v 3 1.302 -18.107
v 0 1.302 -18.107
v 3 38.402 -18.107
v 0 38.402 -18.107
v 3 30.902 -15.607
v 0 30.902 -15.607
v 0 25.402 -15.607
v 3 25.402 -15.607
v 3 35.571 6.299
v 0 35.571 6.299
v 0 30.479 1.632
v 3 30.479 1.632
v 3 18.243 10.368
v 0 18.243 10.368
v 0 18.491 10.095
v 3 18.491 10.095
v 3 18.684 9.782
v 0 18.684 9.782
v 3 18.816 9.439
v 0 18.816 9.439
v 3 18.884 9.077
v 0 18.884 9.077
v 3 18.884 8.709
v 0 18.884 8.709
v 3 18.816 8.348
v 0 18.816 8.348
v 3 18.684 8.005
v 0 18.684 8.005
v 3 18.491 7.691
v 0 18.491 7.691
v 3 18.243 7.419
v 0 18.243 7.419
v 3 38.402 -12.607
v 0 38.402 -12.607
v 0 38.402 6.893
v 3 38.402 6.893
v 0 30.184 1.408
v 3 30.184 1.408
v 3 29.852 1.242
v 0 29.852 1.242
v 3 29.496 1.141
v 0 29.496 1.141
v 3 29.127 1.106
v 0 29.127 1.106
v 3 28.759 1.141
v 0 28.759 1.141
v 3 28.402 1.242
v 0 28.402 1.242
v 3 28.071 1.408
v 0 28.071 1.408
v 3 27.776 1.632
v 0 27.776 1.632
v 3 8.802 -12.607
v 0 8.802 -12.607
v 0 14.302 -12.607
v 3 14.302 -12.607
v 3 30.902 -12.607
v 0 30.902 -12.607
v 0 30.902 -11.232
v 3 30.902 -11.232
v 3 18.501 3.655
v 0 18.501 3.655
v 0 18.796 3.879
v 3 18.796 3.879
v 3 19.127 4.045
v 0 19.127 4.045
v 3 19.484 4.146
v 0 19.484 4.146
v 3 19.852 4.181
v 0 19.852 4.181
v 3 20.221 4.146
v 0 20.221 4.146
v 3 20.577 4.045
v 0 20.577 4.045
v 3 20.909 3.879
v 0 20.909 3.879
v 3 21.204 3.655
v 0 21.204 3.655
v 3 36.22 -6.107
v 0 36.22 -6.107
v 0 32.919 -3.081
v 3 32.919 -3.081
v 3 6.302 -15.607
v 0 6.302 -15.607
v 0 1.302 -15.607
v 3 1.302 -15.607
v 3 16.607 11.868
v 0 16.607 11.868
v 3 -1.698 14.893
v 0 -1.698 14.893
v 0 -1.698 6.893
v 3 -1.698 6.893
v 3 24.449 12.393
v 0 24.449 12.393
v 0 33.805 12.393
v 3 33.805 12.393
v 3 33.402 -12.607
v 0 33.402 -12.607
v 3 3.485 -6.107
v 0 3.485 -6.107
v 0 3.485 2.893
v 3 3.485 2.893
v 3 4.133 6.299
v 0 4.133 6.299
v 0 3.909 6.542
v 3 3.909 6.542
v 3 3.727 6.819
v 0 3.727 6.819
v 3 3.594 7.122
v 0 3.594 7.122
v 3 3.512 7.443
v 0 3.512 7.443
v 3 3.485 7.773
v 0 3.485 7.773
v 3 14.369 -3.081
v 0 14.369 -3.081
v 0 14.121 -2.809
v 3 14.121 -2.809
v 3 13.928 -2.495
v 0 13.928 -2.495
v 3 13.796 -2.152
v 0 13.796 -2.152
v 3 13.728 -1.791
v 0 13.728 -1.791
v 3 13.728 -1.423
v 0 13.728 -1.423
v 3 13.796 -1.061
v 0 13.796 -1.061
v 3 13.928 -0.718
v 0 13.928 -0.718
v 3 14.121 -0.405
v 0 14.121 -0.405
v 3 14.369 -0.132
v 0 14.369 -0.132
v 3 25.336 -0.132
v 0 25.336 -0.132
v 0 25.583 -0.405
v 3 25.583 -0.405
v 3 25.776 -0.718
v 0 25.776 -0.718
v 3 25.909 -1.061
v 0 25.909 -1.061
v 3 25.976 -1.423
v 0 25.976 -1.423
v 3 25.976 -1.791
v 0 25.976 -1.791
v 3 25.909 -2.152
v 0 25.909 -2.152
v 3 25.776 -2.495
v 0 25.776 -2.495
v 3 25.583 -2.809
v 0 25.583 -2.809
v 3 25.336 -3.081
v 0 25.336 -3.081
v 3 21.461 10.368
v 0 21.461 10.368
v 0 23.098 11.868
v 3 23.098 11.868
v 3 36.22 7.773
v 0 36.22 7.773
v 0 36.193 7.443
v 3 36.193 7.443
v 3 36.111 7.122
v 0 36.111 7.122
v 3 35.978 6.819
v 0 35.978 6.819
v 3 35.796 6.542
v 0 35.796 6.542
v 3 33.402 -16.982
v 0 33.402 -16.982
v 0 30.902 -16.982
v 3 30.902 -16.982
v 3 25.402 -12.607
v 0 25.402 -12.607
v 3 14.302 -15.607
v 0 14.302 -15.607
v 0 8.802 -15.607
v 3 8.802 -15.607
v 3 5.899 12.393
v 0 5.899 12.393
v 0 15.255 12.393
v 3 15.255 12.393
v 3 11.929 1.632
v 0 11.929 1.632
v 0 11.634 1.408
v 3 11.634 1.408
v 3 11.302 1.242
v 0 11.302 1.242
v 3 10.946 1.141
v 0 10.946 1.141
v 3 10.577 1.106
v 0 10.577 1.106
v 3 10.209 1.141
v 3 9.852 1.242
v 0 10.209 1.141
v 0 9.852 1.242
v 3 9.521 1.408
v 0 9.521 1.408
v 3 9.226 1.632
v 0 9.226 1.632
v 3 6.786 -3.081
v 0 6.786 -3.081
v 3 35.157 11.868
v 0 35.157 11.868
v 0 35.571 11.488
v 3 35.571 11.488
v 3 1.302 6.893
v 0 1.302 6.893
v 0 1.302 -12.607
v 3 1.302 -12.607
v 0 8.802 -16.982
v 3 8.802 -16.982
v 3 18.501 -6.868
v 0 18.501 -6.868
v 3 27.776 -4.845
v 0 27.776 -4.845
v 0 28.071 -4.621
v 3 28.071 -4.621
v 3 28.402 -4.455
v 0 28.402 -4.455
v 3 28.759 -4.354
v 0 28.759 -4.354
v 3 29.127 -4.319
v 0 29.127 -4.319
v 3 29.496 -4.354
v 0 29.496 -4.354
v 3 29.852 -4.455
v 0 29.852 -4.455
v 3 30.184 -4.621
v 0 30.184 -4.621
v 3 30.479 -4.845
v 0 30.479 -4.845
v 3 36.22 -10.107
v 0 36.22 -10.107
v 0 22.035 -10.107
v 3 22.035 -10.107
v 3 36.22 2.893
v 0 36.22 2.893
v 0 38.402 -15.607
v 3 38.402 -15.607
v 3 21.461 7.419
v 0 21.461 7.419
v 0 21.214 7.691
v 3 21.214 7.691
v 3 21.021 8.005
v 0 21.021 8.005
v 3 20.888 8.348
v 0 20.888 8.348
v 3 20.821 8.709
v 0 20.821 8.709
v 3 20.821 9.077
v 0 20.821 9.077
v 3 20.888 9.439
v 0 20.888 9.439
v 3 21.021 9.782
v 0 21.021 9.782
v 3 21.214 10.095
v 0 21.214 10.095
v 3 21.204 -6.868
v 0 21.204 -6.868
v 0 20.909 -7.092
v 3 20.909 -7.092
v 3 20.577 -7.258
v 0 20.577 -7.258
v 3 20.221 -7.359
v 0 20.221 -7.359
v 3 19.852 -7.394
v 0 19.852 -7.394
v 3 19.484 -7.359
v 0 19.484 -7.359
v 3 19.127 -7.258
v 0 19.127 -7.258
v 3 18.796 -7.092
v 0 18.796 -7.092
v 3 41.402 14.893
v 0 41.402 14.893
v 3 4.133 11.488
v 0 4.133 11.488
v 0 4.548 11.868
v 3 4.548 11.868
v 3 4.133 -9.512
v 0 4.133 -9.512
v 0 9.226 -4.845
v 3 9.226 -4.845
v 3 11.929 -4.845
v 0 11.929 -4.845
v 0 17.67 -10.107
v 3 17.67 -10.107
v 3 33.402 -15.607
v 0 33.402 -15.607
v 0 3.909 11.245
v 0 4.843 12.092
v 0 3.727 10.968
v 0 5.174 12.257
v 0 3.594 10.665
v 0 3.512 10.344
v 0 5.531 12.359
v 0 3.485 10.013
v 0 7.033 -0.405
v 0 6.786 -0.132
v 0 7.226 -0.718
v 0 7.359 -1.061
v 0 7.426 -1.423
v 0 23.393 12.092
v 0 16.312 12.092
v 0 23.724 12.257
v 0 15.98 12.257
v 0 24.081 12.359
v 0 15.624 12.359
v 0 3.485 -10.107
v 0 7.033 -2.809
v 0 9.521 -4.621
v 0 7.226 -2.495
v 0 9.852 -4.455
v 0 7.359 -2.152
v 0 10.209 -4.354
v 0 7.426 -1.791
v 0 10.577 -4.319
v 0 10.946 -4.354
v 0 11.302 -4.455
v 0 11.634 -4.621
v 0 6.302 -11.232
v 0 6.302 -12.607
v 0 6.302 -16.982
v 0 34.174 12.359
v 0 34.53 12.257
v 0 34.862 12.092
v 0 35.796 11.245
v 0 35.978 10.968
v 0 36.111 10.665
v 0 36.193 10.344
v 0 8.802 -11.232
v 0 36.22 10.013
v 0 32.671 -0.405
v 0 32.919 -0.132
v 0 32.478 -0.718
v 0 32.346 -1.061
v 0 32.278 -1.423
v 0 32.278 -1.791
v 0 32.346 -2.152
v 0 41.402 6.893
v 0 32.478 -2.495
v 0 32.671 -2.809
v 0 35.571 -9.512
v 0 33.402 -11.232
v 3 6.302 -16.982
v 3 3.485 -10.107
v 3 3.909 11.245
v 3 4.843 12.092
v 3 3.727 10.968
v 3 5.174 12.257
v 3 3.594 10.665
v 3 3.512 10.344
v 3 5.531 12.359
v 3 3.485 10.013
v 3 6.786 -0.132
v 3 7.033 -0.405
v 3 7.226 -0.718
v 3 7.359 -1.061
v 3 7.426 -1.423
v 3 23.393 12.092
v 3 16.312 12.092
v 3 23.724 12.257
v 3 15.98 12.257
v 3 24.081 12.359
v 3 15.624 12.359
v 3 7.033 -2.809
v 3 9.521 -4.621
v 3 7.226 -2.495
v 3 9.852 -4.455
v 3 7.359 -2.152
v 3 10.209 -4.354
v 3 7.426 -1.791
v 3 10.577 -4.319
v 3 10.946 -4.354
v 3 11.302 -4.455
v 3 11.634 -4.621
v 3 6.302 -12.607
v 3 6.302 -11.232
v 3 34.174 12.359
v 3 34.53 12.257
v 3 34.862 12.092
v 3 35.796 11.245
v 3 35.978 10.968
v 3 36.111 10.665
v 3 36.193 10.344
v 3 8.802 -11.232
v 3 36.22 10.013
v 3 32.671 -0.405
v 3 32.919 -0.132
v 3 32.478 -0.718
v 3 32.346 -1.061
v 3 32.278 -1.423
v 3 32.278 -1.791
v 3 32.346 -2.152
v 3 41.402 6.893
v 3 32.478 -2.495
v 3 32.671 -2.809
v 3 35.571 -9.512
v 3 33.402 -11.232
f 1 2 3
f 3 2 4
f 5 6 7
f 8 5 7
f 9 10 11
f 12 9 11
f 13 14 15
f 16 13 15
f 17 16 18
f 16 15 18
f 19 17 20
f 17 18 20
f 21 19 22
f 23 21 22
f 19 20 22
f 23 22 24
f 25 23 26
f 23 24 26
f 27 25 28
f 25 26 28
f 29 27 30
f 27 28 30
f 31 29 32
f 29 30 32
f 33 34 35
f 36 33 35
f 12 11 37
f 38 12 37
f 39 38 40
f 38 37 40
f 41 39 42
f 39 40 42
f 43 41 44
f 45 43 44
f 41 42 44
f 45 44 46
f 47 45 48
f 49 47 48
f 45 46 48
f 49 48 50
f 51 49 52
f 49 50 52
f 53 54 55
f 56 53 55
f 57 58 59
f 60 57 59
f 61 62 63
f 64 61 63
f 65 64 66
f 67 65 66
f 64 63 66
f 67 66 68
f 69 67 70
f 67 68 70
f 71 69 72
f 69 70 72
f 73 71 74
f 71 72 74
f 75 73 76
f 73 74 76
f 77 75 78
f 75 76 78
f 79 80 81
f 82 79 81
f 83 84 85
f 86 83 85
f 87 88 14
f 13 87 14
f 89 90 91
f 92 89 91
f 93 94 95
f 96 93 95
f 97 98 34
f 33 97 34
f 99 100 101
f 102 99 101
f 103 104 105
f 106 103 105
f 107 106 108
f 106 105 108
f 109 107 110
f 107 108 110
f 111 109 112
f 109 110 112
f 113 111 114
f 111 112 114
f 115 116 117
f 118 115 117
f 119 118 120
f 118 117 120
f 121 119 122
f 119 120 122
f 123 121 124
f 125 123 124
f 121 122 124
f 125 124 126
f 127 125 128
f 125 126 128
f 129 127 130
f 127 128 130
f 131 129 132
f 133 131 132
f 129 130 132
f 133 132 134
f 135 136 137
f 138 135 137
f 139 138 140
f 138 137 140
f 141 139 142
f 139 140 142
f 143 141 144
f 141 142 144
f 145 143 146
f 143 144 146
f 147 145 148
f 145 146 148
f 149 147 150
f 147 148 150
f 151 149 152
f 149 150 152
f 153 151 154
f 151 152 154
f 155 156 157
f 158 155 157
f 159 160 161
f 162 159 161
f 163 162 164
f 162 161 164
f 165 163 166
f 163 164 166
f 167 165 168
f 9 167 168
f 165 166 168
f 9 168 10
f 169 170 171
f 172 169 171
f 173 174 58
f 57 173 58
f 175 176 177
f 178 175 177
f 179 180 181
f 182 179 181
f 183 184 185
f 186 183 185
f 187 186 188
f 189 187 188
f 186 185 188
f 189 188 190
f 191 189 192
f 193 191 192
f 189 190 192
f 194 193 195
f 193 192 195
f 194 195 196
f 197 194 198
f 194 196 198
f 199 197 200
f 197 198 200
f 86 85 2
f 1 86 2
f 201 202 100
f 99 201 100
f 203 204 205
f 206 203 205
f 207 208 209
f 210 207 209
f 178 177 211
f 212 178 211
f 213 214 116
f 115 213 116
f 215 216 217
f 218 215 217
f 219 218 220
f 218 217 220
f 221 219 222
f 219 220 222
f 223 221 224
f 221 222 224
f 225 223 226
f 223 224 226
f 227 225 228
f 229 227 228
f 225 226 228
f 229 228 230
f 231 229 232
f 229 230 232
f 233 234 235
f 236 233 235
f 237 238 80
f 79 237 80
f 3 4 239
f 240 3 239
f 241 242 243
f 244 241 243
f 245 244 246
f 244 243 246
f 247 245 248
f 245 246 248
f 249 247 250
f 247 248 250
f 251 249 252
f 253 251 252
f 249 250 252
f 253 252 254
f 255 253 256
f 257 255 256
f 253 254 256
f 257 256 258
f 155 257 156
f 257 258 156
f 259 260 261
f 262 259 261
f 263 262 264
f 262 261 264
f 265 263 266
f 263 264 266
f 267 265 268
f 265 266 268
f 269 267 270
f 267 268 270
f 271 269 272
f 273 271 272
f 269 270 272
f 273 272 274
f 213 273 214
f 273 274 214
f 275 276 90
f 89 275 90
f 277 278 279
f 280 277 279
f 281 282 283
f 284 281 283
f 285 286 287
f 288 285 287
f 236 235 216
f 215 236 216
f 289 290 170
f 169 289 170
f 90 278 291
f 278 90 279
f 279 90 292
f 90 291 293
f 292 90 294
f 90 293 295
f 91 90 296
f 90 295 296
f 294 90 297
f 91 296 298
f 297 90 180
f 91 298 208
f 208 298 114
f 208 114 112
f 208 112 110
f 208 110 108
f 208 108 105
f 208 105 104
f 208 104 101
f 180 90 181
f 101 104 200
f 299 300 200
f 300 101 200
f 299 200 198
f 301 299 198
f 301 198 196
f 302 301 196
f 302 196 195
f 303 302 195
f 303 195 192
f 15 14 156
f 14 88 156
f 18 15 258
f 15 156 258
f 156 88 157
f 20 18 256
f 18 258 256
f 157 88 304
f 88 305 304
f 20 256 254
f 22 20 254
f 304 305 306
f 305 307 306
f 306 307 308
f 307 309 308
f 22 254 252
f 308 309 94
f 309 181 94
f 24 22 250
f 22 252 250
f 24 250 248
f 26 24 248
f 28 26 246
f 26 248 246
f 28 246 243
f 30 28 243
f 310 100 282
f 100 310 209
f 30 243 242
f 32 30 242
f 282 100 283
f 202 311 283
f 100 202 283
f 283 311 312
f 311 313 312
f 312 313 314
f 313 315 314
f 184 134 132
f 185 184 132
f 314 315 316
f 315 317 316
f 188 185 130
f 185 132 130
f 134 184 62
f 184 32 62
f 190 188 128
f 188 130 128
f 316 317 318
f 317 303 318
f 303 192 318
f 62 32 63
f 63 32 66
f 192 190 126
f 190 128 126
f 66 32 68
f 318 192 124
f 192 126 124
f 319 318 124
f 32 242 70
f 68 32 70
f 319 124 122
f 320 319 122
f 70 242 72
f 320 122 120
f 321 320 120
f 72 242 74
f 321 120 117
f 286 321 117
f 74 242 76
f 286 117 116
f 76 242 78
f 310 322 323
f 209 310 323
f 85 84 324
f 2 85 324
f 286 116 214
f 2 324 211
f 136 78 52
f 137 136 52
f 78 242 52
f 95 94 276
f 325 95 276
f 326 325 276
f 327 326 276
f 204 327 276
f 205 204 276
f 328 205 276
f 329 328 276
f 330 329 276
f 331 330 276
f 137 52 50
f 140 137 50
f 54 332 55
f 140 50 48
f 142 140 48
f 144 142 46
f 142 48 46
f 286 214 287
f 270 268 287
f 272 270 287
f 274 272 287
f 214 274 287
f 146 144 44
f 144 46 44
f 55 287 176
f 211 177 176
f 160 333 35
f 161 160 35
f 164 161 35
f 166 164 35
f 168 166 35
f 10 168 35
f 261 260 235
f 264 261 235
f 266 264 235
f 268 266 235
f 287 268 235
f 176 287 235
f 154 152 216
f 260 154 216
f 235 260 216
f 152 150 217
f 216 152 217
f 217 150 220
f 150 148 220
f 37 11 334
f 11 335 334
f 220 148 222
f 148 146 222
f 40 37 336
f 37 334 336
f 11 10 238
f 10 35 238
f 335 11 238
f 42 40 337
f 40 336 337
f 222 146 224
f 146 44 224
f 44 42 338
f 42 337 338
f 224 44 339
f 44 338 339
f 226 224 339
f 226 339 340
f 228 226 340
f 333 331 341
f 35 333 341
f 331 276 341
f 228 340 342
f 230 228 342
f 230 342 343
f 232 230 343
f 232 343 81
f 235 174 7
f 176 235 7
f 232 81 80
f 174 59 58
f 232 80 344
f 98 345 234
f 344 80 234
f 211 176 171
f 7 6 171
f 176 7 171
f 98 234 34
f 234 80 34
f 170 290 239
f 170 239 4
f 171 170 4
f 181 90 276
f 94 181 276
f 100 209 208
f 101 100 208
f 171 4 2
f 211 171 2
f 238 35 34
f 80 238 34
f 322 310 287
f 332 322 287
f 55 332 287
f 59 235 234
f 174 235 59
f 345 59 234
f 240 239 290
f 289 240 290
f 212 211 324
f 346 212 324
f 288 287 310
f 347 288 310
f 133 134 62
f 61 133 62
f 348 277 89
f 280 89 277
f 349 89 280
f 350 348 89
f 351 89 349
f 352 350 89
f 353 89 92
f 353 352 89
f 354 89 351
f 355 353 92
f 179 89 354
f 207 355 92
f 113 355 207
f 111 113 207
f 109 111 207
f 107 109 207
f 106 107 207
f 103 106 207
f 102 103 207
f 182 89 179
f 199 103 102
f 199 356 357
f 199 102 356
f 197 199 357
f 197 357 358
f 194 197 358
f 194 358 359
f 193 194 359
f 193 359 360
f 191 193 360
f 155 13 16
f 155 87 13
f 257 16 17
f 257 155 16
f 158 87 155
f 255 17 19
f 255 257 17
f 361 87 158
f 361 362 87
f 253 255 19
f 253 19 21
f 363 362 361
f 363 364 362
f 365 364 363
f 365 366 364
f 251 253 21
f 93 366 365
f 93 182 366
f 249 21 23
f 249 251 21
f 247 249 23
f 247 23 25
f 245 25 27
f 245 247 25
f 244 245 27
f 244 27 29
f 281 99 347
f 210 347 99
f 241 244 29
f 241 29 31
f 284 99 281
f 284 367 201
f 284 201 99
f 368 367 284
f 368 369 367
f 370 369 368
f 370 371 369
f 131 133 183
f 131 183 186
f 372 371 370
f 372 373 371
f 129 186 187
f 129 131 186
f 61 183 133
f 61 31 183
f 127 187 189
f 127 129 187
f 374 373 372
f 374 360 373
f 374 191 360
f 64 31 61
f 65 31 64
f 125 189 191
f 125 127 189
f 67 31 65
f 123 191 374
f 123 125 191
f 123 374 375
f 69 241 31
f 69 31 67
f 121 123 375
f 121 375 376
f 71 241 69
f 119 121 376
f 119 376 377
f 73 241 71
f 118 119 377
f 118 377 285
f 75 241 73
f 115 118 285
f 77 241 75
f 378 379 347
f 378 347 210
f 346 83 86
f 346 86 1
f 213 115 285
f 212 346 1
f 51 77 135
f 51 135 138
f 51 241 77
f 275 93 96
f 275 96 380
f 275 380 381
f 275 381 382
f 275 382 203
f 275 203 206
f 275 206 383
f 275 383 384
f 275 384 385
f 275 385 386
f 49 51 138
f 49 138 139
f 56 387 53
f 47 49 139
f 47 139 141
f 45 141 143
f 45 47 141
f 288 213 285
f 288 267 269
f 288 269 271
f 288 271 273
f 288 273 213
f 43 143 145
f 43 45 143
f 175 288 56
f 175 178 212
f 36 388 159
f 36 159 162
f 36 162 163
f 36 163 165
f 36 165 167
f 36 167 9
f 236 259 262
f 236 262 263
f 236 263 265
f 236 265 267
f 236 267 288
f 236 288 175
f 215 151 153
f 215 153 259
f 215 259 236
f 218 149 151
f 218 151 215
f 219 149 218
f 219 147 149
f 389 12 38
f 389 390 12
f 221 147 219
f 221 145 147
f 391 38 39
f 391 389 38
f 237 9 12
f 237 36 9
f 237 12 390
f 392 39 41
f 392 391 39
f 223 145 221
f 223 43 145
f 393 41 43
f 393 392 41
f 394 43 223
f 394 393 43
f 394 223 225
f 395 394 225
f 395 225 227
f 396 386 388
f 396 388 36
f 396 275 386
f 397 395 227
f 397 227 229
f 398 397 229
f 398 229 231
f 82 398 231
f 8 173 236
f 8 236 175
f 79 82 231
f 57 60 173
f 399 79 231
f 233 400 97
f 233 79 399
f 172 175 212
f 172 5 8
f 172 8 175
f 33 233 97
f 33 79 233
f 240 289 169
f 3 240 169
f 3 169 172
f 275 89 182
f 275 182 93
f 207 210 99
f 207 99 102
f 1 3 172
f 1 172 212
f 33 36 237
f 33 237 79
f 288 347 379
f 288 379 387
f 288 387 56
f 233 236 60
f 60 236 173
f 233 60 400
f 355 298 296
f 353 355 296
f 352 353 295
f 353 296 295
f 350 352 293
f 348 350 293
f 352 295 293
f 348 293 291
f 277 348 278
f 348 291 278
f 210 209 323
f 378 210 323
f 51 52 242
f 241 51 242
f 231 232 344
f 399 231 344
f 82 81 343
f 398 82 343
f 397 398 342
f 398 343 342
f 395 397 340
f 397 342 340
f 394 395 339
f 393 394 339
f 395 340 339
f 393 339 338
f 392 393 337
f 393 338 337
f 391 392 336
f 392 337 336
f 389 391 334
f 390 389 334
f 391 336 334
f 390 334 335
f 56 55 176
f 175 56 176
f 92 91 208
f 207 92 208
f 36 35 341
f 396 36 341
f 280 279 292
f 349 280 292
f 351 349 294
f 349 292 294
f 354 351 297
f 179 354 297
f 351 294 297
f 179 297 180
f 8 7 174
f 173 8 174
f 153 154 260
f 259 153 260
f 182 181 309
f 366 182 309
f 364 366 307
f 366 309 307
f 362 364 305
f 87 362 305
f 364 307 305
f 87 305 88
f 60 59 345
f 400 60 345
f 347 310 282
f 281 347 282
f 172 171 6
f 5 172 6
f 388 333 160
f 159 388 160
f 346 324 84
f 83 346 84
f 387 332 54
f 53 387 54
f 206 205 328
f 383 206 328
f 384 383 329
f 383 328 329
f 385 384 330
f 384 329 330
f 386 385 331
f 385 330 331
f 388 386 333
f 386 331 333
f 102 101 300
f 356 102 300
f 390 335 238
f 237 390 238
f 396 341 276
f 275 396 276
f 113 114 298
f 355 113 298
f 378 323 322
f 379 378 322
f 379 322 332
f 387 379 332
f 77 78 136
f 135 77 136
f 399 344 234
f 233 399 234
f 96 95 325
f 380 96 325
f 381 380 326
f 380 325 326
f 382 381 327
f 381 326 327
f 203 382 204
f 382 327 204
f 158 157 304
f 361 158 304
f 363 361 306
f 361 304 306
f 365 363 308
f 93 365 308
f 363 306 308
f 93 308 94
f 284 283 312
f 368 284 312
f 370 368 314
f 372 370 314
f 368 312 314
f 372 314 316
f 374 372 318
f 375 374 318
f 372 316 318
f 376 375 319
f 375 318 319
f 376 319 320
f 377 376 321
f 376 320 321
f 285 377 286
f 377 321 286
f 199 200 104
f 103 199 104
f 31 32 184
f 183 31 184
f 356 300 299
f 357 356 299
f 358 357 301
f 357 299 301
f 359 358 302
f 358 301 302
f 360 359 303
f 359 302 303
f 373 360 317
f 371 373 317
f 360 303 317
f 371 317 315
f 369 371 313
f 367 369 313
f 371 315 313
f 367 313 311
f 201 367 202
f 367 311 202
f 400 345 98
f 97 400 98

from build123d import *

# Parameters (mm, degrees)
RESSALTO_EXTRUS_O1_DEPTH = 3


with BuildPart() as part:
    # Esboço1 → Ressalto-extrusão1 (new body)
    with BuildSketch(Plane(origin=(0, 0, 0), x_dir=(0, 0, -1), z_dir=(1, 0, 0))):
        Polygon((9.606615439, 38.402396467), (-6.893384561, 38.402396467), (-6.893384561, 41.402396467), (-14.893384561, 41.402396467), (-14.893384561, 38.402396467), (-14.893384561, 1.302396467), (-14.893384561, -1.697603533), (-6.893384561, -1.697603533), (-6.893384561, 1.302396467), (9.606615439, 1.302396467), (10.106615439, 1.302396467), (12.106615439, 1.302396467), (12.606615439, 1.302396467), (12.606615439, 6.302396467), (11.231615439, 6.302396467), (11.231615439, 8.802396467), (12.606615439, 8.802396467), (12.606615439, 14.302396467), (15.606615439, 14.302396467), (15.606615439, 8.802396467), (16.981615439, 8.802396467), (16.981615439, 6.302396467), (15.606615439, 6.302396467), (15.606615439, 1.302396467), (18.106615439, 1.302396467), (18.106615439, 38.402396467), (15.606615439, 38.402396467), (15.606615439, 33.402396467), (16.981615439, 33.402396467), (16.981615439, 30.902396467), (15.606615439, 30.902396467), (15.606615439, 25.402396467), (12.606615439, 25.402396467), (12.606615439, 30.902396467), (11.231615439, 30.902396467), (11.231615439, 33.402396467), (12.606615439, 33.402396467), (12.606615439, 38.402396467), (12.106615439, 38.402396467), (10.106615439, 38.402396467), align=None)
        with BuildLine():
            Line((-7.41891132, 18.243485959), (-1.631744546, 11.928665745))
            ThreePointArc((-1.631744546, 11.928665745), (-1.106217787, 10.577396467), (-1.631744546, 9.226127189))
            Line((-1.631744546, 9.226127189), (-6.298860449, 4.13348013))
            ThreePointArc((-6.298860449, 4.13348013), (-6.967895473, 3.654102179), (-7.77333369, 3.484749408))
            Line((-7.77333369, 3.484749408), (-10.013435432, 3.484749408))
            ThreePointArc((-10.013435432, 3.484749408), (-10.818873649, 3.654102179), (-11.487908673, 4.13348013))
            Line((-11.487908673, 4.13348013), (-11.867857802, 4.54807168))
            ThreePointArc((-11.867857802, 4.54807168), (-12.257378456, 5.174408714), (-12.393384561, 5.899340958))
            Line((-12.393384561, 5.899340958), (-12.393384561, 15.255451976))
            ThreePointArc((-12.393384561, 15.255451976), (-12.257378456, 15.98038422), (-11.867857802, 16.606721254))
            Line((-11.867857802, 16.606721254), (-10.367857802, 18.243485959))
            ThreePointArc((-10.367857802, 18.243485959), (-8.893384561, 18.892216682), (-7.41891132, 18.243485959))
        make_face(mode=Mode.SUBTRACT)
        with BuildLine():
            Line((3.08108868, 6.786133018), (6.106615439, 3.484749408))
            Line((6.106615439, 3.484749408), (-2.893384561, 3.484749408))
            Line((-2.893384561, 3.484749408), (0.132142198, 6.786133018))
            ThreePointArc((0.132142198, 6.786133018), (1.606615439, 7.434863741), (3.08108868, 6.786133018))
        make_face(mode=Mode.SUBTRACT)
        with BuildLine():
            Line((10.106615439, 17.670043526), (10.106615439, 3.484749408))
            Line((10.106615439, 3.484749408), (9.512091327, 4.13348013))
            Line((9.512091327, 4.13348013), (4.844975424, 9.226127189))
            ThreePointArc((4.844975424, 9.226127189), (4.319448665, 10.577396467), (4.844975424, 11.928665745))
            Line((4.844975424, 11.928665745), (10.106615439, 17.670043526))
        make_face(mode=Mode.SUBTRACT)
        with BuildLine():
            ThreePointArc((3.08108868, 14.368659915), (1.606615439, 13.719929193), (0.132142198, 14.368659915))
            Line((0.132142198, 14.368659915), (-3.655024576, 18.501127189))
            ThreePointArc((-3.655024576, 18.501127189), (-4.180551335, 19.852396467), (-3.655024576, 21.203665745))
            Line((-3.655024576, 21.203665745), (0.132142198, 25.336133018))
            ThreePointArc((0.132142198, 25.336133018), (1.606615439, 25.984863741), (3.08108868, 25.336133018))
            Line((3.08108868, 25.336133018), (6.868255454, 21.203665745))
            ThreePointArc((6.868255454, 21.203665745), (7.393782213, 19.852396467), (6.868255454, 18.501127189))
            Line((6.868255454, 18.501127189), (3.08108868, 14.368659915))
        make_face(mode=Mode.SUBTRACT)
        with BuildLine():
            ThreePointArc((-11.867857802, 23.09807168), (-12.257378456, 23.724408714), (-12.393384561, 24.449340958))
            Line((-12.393384561, 24.449340958), (-12.393384561, 33.805451976))
            ThreePointArc((-12.393384561, 33.805451976), (-12.257378456, 34.53038422), (-11.867857802, 35.156721254))
            Line((-11.867857802, 35.156721254), (-11.487908673, 35.571312803))
            ThreePointArc((-11.487908673, 35.571312803), (-10.818873649, 36.050690755), (-10.013435432, 36.220043526))
            Line((-10.013435432, 36.220043526), (-7.77333369, 36.220043526))
            ThreePointArc((-7.77333369, 36.220043526), (-6.967895473, 36.050690755), (-6.298860449, 35.571312803))
            Line((-6.298860449, 35.571312803), (-1.631744546, 30.478665745))
            ThreePointArc((-1.631744546, 30.478665745), (-1.106217787, 29.127396467), (-1.631744546, 27.776127189))
            Line((-1.631744546, 27.776127189), (-7.41891132, 21.461306974))
            ThreePointArc((-7.41891132, 21.461306974), (-8.893384561, 20.812576252), (-10.367857802, 21.461306974))
            Line((-10.367857802, 21.461306974), (-11.867857802, 23.09807168))
        make_face(mode=Mode.SUBTRACT)
        with BuildLine():
            Line((9.512091327, 35.571312803), (10.106615439, 36.220043526))
            Line((10.106615439, 36.220043526), (10.106615439, 22.034749408))
            Line((10.106615439, 22.034749408), (4.844975424, 27.776127189))
            ThreePointArc((4.844975424, 27.776127189), (4.319448665, 29.127396467), (4.844975424, 30.478665745))
            Line((4.844975424, 30.478665745), (9.512091327, 35.571312803))
        make_face(mode=Mode.SUBTRACT)
        with BuildLine():
            Line((0.132142198, 32.918659915), (-2.893384561, 36.220043526))
            Line((-2.893384561, 36.220043526), (6.106615439, 36.220043526))
            Line((6.106615439, 36.220043526), (3.08108868, 32.918659915))
            ThreePointArc((3.08108868, 32.918659915), (1.606615439, 32.269929193), (0.132142198, 32.918659915))
        make_face(mode=Mode.SUBTRACT)
    extrude(amount=RESSALTO_EXTRUS_O1_DEPTH)


solid = part.part
